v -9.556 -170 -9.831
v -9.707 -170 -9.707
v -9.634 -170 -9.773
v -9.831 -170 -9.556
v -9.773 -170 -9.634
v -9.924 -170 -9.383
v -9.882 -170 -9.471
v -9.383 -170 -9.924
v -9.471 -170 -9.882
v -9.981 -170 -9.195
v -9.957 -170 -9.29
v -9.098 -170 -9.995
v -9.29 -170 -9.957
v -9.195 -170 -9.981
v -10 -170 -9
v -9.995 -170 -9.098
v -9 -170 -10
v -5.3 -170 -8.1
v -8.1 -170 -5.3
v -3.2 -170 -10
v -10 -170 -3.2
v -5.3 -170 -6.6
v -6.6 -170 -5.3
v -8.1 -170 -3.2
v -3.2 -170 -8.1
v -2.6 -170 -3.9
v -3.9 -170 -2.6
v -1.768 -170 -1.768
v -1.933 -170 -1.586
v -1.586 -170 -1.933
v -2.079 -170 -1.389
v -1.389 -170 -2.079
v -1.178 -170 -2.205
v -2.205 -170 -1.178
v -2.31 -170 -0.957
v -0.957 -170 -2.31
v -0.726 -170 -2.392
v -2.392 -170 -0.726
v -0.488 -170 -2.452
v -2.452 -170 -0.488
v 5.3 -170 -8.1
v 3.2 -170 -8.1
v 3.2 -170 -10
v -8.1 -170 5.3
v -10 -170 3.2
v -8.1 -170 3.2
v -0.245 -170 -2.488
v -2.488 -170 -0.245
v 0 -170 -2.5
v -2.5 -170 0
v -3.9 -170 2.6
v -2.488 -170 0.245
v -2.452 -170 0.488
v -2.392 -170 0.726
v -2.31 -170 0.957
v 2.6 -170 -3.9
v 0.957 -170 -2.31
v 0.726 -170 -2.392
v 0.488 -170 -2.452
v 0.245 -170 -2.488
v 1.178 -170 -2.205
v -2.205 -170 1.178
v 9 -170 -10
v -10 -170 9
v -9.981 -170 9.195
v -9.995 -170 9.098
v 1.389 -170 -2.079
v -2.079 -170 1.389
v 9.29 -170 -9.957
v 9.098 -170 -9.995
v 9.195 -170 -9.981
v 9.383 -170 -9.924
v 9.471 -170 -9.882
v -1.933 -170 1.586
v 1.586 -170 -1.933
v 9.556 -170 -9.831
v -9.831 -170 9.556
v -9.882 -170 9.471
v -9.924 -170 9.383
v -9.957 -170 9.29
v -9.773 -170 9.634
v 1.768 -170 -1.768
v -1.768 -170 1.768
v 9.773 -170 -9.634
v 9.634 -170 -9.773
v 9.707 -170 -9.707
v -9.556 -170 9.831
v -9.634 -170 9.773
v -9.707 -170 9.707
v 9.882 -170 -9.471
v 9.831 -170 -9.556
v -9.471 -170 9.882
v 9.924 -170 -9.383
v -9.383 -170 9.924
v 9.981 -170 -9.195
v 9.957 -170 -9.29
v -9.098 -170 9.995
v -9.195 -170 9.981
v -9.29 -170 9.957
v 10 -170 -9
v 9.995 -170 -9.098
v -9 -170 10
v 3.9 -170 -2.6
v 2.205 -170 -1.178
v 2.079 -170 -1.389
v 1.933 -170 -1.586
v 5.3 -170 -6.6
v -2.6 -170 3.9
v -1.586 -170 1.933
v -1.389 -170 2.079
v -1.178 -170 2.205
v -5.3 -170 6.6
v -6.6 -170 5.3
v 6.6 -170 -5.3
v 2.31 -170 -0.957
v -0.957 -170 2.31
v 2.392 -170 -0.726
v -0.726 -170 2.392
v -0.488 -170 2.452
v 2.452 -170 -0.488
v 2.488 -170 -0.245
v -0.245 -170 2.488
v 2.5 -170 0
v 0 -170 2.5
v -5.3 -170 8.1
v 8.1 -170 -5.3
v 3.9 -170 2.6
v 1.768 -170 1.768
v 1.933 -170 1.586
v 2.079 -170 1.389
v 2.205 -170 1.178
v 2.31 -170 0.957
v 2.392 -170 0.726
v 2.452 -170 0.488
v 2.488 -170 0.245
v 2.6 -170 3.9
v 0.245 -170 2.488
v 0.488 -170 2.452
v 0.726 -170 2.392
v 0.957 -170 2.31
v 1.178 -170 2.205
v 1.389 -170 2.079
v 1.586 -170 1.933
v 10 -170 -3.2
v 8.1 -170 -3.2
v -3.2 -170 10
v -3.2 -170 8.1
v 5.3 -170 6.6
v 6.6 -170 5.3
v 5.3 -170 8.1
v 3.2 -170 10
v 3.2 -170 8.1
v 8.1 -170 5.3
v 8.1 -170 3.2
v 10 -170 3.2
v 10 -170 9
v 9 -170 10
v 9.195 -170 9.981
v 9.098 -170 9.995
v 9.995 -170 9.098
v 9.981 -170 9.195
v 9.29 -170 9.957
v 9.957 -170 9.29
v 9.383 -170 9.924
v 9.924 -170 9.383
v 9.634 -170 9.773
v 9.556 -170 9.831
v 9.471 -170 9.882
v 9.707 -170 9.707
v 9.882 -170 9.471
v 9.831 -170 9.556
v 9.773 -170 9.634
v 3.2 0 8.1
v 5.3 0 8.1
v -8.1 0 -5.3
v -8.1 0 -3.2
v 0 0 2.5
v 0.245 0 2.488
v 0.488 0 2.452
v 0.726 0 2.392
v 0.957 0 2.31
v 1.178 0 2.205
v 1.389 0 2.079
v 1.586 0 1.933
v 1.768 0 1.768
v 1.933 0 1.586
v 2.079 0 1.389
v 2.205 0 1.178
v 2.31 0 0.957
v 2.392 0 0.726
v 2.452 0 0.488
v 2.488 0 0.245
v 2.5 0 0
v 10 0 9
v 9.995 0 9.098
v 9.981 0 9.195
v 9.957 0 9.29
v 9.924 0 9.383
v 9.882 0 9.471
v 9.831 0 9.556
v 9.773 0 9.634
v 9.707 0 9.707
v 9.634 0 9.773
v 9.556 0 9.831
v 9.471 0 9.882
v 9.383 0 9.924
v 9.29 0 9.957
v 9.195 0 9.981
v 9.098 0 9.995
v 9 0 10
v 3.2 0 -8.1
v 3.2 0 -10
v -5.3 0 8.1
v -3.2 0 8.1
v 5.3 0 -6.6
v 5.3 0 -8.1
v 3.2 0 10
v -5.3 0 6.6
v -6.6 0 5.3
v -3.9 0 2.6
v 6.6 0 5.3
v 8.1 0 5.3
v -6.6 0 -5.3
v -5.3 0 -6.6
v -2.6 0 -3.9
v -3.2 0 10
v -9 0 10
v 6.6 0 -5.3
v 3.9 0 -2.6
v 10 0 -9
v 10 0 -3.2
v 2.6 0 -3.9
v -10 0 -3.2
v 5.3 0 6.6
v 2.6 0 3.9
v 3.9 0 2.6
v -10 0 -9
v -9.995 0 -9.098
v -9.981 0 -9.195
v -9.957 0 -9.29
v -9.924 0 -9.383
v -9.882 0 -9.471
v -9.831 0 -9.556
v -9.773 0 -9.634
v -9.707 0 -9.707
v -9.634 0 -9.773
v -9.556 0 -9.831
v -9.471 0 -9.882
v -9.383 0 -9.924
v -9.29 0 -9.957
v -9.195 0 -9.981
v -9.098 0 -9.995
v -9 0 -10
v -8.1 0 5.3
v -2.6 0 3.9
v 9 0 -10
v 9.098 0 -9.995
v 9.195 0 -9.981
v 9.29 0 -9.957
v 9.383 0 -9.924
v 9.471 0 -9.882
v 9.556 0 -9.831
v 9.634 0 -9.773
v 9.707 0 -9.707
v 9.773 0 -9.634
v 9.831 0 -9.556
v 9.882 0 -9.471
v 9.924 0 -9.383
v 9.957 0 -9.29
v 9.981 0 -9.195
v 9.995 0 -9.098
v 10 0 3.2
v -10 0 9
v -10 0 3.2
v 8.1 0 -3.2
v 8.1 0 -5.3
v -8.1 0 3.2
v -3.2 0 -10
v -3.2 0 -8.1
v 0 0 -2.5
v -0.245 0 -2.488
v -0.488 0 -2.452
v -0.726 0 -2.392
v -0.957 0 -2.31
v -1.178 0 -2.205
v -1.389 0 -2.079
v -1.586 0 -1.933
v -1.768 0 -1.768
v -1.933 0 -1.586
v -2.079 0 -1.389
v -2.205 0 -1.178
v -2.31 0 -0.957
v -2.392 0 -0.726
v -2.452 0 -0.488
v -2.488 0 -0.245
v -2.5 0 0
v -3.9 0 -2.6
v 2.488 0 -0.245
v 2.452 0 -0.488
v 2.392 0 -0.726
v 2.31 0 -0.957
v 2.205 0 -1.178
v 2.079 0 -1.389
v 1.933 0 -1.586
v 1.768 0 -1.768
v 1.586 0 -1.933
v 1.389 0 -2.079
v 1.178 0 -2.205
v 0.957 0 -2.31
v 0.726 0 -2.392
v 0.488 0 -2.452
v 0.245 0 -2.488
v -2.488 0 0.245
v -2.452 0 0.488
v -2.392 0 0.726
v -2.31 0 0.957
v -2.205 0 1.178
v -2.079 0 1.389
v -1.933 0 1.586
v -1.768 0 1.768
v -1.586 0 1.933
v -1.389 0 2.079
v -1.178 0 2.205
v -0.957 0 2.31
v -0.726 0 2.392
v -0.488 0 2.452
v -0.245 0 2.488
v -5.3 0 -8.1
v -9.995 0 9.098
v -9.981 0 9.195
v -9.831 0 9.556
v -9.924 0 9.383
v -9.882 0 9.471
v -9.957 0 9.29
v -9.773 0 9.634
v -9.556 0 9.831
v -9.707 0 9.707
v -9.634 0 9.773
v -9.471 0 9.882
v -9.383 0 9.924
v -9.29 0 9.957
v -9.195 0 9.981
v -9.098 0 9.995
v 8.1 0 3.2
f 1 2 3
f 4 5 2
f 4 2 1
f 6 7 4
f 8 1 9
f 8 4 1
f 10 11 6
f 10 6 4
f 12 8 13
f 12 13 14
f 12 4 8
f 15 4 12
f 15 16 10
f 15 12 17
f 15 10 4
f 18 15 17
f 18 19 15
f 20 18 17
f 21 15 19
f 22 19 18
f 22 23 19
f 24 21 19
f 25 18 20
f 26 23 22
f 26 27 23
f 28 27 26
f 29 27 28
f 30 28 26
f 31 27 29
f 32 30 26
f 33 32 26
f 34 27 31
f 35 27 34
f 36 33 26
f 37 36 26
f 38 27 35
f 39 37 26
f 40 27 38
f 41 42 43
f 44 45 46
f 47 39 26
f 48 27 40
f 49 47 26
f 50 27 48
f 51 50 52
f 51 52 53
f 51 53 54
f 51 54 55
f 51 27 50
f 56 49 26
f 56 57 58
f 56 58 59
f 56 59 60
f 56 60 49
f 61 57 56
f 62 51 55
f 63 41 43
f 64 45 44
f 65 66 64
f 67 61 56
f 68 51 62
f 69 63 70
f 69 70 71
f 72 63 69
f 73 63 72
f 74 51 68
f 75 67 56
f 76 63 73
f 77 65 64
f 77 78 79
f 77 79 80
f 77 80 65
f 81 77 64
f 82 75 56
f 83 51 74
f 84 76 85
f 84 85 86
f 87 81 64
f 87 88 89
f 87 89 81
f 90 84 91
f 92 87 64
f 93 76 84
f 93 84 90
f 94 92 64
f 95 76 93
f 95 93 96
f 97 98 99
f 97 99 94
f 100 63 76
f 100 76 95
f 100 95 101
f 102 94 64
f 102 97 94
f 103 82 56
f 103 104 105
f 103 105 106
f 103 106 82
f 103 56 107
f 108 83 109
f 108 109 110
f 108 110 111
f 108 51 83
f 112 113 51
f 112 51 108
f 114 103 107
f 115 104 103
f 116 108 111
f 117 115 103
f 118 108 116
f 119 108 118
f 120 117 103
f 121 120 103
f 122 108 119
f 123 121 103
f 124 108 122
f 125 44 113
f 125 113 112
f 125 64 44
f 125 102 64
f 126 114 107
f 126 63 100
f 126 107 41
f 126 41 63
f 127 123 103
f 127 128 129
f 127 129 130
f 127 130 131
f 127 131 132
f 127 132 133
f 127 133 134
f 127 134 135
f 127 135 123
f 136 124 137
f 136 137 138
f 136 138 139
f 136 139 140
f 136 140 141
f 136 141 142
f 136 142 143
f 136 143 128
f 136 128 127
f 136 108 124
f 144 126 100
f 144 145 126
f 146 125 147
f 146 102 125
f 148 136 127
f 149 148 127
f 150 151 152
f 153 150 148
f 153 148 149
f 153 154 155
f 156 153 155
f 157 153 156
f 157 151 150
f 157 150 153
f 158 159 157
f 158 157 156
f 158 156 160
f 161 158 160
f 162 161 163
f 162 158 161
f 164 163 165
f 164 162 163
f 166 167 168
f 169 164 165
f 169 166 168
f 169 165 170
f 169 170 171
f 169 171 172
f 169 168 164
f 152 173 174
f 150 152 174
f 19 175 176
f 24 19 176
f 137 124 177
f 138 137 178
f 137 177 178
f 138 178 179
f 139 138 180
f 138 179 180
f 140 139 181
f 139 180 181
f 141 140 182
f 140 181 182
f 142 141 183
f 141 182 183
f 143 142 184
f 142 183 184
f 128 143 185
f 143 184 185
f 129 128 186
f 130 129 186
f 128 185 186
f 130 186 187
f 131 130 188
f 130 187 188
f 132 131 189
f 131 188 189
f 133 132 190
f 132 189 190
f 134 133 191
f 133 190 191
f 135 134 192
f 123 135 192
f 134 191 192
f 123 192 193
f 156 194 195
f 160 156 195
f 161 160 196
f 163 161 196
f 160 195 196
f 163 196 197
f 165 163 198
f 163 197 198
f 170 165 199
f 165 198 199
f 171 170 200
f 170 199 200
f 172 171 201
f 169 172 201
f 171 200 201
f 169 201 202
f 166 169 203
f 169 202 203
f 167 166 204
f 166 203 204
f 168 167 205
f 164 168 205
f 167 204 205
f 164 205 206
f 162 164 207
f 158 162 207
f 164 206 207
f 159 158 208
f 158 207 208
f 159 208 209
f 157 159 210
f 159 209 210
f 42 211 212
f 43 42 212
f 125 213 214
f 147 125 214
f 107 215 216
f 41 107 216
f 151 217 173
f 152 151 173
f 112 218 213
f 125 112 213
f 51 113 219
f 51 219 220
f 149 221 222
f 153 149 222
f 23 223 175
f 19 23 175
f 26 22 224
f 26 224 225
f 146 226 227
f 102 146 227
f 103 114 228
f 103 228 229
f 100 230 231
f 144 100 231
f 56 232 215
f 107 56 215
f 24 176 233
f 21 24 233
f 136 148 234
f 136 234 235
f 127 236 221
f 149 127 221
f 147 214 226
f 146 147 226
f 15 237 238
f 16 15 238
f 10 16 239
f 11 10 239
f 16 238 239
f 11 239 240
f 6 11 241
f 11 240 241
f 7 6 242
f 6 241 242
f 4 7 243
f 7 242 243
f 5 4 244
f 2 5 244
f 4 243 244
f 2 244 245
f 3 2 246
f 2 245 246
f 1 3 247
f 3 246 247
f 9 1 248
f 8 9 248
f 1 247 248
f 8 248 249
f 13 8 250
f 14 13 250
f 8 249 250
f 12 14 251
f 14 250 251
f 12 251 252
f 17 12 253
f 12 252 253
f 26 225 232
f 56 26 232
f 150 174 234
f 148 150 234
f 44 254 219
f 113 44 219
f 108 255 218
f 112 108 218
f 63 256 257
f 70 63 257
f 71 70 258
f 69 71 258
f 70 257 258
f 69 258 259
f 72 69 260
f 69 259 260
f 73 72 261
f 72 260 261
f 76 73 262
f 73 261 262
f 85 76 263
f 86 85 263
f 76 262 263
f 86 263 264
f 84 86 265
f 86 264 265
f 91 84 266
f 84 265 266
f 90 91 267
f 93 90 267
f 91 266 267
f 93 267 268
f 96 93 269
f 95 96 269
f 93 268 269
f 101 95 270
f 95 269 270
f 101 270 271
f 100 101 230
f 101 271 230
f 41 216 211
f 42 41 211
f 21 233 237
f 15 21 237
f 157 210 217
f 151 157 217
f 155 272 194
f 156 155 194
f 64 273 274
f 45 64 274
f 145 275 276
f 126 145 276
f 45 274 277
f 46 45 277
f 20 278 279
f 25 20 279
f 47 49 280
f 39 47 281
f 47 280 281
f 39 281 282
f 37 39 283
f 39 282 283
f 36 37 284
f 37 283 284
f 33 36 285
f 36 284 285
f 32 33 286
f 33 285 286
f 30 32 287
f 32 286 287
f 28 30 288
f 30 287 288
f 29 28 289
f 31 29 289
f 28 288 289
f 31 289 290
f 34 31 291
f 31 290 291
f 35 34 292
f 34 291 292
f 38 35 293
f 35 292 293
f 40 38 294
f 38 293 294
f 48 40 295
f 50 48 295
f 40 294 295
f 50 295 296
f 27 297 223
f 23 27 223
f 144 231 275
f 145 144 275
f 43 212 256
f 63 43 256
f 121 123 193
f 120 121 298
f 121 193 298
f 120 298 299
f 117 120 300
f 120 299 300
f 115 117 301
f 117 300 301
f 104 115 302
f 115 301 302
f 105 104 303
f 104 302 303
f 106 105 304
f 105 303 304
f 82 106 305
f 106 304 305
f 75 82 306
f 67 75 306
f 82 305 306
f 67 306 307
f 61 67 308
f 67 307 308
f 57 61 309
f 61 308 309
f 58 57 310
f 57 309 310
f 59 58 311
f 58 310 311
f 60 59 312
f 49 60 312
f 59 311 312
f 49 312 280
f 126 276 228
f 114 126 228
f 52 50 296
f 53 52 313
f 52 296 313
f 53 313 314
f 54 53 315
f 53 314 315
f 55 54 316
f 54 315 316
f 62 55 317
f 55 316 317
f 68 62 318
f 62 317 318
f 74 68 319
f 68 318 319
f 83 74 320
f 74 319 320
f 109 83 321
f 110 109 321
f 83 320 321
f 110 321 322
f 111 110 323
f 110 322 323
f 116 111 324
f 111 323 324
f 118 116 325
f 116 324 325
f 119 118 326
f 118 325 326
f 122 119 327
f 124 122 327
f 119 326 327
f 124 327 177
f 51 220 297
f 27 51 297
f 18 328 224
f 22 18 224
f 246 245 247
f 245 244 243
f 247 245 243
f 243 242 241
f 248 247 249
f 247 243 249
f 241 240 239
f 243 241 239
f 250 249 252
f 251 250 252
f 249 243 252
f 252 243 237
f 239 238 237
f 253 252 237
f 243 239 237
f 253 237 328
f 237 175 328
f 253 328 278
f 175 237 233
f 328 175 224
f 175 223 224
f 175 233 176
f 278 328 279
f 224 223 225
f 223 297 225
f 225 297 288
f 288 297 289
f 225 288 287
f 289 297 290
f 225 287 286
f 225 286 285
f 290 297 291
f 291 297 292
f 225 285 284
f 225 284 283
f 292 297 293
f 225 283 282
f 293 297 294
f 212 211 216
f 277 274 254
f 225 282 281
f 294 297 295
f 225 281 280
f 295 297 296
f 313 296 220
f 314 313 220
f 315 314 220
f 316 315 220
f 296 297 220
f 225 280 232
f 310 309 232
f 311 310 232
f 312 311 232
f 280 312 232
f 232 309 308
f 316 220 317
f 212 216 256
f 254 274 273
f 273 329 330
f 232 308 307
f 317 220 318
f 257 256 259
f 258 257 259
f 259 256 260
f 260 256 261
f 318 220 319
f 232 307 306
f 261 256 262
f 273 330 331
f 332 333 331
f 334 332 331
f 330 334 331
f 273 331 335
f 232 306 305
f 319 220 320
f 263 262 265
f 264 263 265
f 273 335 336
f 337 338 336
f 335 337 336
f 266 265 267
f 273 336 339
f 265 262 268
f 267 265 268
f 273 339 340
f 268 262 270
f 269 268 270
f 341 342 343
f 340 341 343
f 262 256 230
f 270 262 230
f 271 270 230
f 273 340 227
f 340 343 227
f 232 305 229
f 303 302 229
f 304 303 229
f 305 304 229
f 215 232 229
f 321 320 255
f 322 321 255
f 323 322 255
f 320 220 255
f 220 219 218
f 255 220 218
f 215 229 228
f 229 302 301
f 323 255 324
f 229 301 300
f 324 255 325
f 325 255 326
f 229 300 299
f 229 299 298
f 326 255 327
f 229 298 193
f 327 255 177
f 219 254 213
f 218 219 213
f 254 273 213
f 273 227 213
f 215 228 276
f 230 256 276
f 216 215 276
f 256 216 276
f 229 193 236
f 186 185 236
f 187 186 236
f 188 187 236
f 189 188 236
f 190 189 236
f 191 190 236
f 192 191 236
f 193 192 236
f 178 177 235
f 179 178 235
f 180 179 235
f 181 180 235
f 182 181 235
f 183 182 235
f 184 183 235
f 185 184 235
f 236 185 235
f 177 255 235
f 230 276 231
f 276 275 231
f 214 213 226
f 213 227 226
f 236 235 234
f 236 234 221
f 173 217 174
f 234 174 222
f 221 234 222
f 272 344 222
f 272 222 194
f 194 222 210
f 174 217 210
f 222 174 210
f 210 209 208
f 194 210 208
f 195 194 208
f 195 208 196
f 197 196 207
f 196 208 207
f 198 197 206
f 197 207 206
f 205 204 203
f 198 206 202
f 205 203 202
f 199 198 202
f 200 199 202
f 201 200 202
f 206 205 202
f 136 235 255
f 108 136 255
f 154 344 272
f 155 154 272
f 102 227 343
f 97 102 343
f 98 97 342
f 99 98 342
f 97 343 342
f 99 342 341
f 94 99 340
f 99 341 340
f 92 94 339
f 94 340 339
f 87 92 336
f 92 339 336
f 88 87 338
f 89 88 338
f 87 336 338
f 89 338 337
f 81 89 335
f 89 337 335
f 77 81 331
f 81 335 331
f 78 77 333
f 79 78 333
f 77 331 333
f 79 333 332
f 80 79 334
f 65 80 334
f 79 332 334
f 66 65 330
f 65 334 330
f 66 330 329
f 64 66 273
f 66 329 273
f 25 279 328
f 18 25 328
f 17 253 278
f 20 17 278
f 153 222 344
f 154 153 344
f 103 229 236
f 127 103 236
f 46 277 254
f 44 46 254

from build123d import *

# Parameters (mm, degrees)
F1_DEPTH = 170


with BuildPart() as f1:
    # F0 (on Front) → F1 (new body)
    with BuildSketch(Plane.XZ):
        with BuildLine():
            Line((0, 2.5), (0, 3.9))
            Line((0, 3.9), (-2.6, 3.9))
            Line((-2.6, 3.9), (-5.3, 6.6))
            Line((-5.3, 6.6), (-5.3, 8.1))
            Line((-5.3, 8.1), (-3.2, 8.1))
            Line((-3.2, 8.1), (-3.2, 10))
            Line((-3.2, 10), (-9, 10))
            ThreePointArc((-9, 10), (-9.707107, 9.707107), (-10, 9))
            Line((-10, 9), (-10, 3.2))
            Line((-10, 3.2), (-8.1, 3.2))
            Line((-8.1, 3.2), (-8.1, 5.3))
            Line((-8.1, 5.3), (-6.6, 5.3))
            Line((-6.6, 5.3), (-3.9, 2.6))
            Line((-3.9, 2.6), (-3.9, 0))
            Line((-3.9, 0), (-2.5, 0))
            ThreePointArc((-2.5, 0), (-1.767767, 1.767767), (0, 2.5))
        make_face()
        with BuildLine():
            Line((9, 10), (3.2, 10))
            Line((3.2, 10), (3.2, 8.1))
            Line((3.2, 8.1), (5.3, 8.1))
            Line((5.3, 8.1), (5.3, 6.6))
            Line((5.3, 6.6), (2.6, 3.9))
            Line((2.6, 3.9), (0, 3.9))
            Line((0, 3.9), (0, 2.5))
            ThreePointArc((0, 2.5), (1.767767, 1.767767), (2.5, 0))
            Line((2.5, 0), (3.9, 0))
            Line((3.9, 0), (3.9, 2.6))
            Line((3.9, 2.6), (6.6, 5.3))
            Line((6.6, 5.3), (8.1, 5.3))
            Line((8.1, 5.3), (8.1, 3.2))
            Line((8.1, 3.2), (10, 3.2))
            Line((10, 3.2), (10, 9))
            ThreePointArc((10, 9), (9.707107, 9.707107), (9, 10))
        make_face()
        with BuildLine():
            Line((3.9, 0), (2.5, 0))
            ThreePointArc((2.5, 0), (1.767767, -1.767767), (0, -2.5))
            Line((0, -2.5), (0, -3.9))
            Line((0, -3.9), (2.6, -3.9))
            Line((2.6, -3.9), (5.3, -6.6))
            Line((5.3, -6.6), (5.3, -8.1))
            Line((5.3, -8.1), (3.2, -8.1))
            Line((3.2, -8.1), (3.2, -10))
            Line((3.2, -10), (9, -10))
            ThreePointArc((9, -10), (9.707107, -9.707107), (10, -9))
            Line((10, -9), (10, -3.2))
            Line((10, -3.2), (8.1, -3.2))
            Line((8.1, -3.2), (8.1, -5.3))
            Line((8.1, -5.3), (6.6, -5.3))
            Line((6.6, -5.3), (3.9, -2.6))
            Line((3.9, -2.6), (3.9, 0))
        make_face()
        with BuildLine():
            ThreePointArc((0, -2.5), (-1.767767, -1.767767), (-2.5, 0))
            Line((-2.5, 0), (-3.9, 0))
            Line((-3.9, 0), (-3.9, -2.6))
            Line((-3.9, -2.6), (-6.6, -5.3))
            Line((-6.6, -5.3), (-8.1, -5.3))
            Line((-8.1, -5.3), (-8.1, -3.2))
            Line((-8.1, -3.2), (-10, -3.2))
            Line((-10, -3.2), (-10, -9))
            ThreePointArc((-10, -9), (-9.707107, -9.707107), (-9, -10))
            Line((-9, -10), (-3.2, -10))
            Line((-3.2, -10), (-3.2, -8.1))
            Line((-3.2, -8.1), (-5.3, -8.1))
            Line((-5.3, -8.1), (-5.3, -6.6))
            Line((-5.3, -6.6), (-2.6, -3.9))
            Line((-2.6, -3.9), (0, -3.9))
            Line((0, -3.9), (0, -2.5))
        make_face()
    extrude(amount=F1_DEPTH)


solid = f1.part
